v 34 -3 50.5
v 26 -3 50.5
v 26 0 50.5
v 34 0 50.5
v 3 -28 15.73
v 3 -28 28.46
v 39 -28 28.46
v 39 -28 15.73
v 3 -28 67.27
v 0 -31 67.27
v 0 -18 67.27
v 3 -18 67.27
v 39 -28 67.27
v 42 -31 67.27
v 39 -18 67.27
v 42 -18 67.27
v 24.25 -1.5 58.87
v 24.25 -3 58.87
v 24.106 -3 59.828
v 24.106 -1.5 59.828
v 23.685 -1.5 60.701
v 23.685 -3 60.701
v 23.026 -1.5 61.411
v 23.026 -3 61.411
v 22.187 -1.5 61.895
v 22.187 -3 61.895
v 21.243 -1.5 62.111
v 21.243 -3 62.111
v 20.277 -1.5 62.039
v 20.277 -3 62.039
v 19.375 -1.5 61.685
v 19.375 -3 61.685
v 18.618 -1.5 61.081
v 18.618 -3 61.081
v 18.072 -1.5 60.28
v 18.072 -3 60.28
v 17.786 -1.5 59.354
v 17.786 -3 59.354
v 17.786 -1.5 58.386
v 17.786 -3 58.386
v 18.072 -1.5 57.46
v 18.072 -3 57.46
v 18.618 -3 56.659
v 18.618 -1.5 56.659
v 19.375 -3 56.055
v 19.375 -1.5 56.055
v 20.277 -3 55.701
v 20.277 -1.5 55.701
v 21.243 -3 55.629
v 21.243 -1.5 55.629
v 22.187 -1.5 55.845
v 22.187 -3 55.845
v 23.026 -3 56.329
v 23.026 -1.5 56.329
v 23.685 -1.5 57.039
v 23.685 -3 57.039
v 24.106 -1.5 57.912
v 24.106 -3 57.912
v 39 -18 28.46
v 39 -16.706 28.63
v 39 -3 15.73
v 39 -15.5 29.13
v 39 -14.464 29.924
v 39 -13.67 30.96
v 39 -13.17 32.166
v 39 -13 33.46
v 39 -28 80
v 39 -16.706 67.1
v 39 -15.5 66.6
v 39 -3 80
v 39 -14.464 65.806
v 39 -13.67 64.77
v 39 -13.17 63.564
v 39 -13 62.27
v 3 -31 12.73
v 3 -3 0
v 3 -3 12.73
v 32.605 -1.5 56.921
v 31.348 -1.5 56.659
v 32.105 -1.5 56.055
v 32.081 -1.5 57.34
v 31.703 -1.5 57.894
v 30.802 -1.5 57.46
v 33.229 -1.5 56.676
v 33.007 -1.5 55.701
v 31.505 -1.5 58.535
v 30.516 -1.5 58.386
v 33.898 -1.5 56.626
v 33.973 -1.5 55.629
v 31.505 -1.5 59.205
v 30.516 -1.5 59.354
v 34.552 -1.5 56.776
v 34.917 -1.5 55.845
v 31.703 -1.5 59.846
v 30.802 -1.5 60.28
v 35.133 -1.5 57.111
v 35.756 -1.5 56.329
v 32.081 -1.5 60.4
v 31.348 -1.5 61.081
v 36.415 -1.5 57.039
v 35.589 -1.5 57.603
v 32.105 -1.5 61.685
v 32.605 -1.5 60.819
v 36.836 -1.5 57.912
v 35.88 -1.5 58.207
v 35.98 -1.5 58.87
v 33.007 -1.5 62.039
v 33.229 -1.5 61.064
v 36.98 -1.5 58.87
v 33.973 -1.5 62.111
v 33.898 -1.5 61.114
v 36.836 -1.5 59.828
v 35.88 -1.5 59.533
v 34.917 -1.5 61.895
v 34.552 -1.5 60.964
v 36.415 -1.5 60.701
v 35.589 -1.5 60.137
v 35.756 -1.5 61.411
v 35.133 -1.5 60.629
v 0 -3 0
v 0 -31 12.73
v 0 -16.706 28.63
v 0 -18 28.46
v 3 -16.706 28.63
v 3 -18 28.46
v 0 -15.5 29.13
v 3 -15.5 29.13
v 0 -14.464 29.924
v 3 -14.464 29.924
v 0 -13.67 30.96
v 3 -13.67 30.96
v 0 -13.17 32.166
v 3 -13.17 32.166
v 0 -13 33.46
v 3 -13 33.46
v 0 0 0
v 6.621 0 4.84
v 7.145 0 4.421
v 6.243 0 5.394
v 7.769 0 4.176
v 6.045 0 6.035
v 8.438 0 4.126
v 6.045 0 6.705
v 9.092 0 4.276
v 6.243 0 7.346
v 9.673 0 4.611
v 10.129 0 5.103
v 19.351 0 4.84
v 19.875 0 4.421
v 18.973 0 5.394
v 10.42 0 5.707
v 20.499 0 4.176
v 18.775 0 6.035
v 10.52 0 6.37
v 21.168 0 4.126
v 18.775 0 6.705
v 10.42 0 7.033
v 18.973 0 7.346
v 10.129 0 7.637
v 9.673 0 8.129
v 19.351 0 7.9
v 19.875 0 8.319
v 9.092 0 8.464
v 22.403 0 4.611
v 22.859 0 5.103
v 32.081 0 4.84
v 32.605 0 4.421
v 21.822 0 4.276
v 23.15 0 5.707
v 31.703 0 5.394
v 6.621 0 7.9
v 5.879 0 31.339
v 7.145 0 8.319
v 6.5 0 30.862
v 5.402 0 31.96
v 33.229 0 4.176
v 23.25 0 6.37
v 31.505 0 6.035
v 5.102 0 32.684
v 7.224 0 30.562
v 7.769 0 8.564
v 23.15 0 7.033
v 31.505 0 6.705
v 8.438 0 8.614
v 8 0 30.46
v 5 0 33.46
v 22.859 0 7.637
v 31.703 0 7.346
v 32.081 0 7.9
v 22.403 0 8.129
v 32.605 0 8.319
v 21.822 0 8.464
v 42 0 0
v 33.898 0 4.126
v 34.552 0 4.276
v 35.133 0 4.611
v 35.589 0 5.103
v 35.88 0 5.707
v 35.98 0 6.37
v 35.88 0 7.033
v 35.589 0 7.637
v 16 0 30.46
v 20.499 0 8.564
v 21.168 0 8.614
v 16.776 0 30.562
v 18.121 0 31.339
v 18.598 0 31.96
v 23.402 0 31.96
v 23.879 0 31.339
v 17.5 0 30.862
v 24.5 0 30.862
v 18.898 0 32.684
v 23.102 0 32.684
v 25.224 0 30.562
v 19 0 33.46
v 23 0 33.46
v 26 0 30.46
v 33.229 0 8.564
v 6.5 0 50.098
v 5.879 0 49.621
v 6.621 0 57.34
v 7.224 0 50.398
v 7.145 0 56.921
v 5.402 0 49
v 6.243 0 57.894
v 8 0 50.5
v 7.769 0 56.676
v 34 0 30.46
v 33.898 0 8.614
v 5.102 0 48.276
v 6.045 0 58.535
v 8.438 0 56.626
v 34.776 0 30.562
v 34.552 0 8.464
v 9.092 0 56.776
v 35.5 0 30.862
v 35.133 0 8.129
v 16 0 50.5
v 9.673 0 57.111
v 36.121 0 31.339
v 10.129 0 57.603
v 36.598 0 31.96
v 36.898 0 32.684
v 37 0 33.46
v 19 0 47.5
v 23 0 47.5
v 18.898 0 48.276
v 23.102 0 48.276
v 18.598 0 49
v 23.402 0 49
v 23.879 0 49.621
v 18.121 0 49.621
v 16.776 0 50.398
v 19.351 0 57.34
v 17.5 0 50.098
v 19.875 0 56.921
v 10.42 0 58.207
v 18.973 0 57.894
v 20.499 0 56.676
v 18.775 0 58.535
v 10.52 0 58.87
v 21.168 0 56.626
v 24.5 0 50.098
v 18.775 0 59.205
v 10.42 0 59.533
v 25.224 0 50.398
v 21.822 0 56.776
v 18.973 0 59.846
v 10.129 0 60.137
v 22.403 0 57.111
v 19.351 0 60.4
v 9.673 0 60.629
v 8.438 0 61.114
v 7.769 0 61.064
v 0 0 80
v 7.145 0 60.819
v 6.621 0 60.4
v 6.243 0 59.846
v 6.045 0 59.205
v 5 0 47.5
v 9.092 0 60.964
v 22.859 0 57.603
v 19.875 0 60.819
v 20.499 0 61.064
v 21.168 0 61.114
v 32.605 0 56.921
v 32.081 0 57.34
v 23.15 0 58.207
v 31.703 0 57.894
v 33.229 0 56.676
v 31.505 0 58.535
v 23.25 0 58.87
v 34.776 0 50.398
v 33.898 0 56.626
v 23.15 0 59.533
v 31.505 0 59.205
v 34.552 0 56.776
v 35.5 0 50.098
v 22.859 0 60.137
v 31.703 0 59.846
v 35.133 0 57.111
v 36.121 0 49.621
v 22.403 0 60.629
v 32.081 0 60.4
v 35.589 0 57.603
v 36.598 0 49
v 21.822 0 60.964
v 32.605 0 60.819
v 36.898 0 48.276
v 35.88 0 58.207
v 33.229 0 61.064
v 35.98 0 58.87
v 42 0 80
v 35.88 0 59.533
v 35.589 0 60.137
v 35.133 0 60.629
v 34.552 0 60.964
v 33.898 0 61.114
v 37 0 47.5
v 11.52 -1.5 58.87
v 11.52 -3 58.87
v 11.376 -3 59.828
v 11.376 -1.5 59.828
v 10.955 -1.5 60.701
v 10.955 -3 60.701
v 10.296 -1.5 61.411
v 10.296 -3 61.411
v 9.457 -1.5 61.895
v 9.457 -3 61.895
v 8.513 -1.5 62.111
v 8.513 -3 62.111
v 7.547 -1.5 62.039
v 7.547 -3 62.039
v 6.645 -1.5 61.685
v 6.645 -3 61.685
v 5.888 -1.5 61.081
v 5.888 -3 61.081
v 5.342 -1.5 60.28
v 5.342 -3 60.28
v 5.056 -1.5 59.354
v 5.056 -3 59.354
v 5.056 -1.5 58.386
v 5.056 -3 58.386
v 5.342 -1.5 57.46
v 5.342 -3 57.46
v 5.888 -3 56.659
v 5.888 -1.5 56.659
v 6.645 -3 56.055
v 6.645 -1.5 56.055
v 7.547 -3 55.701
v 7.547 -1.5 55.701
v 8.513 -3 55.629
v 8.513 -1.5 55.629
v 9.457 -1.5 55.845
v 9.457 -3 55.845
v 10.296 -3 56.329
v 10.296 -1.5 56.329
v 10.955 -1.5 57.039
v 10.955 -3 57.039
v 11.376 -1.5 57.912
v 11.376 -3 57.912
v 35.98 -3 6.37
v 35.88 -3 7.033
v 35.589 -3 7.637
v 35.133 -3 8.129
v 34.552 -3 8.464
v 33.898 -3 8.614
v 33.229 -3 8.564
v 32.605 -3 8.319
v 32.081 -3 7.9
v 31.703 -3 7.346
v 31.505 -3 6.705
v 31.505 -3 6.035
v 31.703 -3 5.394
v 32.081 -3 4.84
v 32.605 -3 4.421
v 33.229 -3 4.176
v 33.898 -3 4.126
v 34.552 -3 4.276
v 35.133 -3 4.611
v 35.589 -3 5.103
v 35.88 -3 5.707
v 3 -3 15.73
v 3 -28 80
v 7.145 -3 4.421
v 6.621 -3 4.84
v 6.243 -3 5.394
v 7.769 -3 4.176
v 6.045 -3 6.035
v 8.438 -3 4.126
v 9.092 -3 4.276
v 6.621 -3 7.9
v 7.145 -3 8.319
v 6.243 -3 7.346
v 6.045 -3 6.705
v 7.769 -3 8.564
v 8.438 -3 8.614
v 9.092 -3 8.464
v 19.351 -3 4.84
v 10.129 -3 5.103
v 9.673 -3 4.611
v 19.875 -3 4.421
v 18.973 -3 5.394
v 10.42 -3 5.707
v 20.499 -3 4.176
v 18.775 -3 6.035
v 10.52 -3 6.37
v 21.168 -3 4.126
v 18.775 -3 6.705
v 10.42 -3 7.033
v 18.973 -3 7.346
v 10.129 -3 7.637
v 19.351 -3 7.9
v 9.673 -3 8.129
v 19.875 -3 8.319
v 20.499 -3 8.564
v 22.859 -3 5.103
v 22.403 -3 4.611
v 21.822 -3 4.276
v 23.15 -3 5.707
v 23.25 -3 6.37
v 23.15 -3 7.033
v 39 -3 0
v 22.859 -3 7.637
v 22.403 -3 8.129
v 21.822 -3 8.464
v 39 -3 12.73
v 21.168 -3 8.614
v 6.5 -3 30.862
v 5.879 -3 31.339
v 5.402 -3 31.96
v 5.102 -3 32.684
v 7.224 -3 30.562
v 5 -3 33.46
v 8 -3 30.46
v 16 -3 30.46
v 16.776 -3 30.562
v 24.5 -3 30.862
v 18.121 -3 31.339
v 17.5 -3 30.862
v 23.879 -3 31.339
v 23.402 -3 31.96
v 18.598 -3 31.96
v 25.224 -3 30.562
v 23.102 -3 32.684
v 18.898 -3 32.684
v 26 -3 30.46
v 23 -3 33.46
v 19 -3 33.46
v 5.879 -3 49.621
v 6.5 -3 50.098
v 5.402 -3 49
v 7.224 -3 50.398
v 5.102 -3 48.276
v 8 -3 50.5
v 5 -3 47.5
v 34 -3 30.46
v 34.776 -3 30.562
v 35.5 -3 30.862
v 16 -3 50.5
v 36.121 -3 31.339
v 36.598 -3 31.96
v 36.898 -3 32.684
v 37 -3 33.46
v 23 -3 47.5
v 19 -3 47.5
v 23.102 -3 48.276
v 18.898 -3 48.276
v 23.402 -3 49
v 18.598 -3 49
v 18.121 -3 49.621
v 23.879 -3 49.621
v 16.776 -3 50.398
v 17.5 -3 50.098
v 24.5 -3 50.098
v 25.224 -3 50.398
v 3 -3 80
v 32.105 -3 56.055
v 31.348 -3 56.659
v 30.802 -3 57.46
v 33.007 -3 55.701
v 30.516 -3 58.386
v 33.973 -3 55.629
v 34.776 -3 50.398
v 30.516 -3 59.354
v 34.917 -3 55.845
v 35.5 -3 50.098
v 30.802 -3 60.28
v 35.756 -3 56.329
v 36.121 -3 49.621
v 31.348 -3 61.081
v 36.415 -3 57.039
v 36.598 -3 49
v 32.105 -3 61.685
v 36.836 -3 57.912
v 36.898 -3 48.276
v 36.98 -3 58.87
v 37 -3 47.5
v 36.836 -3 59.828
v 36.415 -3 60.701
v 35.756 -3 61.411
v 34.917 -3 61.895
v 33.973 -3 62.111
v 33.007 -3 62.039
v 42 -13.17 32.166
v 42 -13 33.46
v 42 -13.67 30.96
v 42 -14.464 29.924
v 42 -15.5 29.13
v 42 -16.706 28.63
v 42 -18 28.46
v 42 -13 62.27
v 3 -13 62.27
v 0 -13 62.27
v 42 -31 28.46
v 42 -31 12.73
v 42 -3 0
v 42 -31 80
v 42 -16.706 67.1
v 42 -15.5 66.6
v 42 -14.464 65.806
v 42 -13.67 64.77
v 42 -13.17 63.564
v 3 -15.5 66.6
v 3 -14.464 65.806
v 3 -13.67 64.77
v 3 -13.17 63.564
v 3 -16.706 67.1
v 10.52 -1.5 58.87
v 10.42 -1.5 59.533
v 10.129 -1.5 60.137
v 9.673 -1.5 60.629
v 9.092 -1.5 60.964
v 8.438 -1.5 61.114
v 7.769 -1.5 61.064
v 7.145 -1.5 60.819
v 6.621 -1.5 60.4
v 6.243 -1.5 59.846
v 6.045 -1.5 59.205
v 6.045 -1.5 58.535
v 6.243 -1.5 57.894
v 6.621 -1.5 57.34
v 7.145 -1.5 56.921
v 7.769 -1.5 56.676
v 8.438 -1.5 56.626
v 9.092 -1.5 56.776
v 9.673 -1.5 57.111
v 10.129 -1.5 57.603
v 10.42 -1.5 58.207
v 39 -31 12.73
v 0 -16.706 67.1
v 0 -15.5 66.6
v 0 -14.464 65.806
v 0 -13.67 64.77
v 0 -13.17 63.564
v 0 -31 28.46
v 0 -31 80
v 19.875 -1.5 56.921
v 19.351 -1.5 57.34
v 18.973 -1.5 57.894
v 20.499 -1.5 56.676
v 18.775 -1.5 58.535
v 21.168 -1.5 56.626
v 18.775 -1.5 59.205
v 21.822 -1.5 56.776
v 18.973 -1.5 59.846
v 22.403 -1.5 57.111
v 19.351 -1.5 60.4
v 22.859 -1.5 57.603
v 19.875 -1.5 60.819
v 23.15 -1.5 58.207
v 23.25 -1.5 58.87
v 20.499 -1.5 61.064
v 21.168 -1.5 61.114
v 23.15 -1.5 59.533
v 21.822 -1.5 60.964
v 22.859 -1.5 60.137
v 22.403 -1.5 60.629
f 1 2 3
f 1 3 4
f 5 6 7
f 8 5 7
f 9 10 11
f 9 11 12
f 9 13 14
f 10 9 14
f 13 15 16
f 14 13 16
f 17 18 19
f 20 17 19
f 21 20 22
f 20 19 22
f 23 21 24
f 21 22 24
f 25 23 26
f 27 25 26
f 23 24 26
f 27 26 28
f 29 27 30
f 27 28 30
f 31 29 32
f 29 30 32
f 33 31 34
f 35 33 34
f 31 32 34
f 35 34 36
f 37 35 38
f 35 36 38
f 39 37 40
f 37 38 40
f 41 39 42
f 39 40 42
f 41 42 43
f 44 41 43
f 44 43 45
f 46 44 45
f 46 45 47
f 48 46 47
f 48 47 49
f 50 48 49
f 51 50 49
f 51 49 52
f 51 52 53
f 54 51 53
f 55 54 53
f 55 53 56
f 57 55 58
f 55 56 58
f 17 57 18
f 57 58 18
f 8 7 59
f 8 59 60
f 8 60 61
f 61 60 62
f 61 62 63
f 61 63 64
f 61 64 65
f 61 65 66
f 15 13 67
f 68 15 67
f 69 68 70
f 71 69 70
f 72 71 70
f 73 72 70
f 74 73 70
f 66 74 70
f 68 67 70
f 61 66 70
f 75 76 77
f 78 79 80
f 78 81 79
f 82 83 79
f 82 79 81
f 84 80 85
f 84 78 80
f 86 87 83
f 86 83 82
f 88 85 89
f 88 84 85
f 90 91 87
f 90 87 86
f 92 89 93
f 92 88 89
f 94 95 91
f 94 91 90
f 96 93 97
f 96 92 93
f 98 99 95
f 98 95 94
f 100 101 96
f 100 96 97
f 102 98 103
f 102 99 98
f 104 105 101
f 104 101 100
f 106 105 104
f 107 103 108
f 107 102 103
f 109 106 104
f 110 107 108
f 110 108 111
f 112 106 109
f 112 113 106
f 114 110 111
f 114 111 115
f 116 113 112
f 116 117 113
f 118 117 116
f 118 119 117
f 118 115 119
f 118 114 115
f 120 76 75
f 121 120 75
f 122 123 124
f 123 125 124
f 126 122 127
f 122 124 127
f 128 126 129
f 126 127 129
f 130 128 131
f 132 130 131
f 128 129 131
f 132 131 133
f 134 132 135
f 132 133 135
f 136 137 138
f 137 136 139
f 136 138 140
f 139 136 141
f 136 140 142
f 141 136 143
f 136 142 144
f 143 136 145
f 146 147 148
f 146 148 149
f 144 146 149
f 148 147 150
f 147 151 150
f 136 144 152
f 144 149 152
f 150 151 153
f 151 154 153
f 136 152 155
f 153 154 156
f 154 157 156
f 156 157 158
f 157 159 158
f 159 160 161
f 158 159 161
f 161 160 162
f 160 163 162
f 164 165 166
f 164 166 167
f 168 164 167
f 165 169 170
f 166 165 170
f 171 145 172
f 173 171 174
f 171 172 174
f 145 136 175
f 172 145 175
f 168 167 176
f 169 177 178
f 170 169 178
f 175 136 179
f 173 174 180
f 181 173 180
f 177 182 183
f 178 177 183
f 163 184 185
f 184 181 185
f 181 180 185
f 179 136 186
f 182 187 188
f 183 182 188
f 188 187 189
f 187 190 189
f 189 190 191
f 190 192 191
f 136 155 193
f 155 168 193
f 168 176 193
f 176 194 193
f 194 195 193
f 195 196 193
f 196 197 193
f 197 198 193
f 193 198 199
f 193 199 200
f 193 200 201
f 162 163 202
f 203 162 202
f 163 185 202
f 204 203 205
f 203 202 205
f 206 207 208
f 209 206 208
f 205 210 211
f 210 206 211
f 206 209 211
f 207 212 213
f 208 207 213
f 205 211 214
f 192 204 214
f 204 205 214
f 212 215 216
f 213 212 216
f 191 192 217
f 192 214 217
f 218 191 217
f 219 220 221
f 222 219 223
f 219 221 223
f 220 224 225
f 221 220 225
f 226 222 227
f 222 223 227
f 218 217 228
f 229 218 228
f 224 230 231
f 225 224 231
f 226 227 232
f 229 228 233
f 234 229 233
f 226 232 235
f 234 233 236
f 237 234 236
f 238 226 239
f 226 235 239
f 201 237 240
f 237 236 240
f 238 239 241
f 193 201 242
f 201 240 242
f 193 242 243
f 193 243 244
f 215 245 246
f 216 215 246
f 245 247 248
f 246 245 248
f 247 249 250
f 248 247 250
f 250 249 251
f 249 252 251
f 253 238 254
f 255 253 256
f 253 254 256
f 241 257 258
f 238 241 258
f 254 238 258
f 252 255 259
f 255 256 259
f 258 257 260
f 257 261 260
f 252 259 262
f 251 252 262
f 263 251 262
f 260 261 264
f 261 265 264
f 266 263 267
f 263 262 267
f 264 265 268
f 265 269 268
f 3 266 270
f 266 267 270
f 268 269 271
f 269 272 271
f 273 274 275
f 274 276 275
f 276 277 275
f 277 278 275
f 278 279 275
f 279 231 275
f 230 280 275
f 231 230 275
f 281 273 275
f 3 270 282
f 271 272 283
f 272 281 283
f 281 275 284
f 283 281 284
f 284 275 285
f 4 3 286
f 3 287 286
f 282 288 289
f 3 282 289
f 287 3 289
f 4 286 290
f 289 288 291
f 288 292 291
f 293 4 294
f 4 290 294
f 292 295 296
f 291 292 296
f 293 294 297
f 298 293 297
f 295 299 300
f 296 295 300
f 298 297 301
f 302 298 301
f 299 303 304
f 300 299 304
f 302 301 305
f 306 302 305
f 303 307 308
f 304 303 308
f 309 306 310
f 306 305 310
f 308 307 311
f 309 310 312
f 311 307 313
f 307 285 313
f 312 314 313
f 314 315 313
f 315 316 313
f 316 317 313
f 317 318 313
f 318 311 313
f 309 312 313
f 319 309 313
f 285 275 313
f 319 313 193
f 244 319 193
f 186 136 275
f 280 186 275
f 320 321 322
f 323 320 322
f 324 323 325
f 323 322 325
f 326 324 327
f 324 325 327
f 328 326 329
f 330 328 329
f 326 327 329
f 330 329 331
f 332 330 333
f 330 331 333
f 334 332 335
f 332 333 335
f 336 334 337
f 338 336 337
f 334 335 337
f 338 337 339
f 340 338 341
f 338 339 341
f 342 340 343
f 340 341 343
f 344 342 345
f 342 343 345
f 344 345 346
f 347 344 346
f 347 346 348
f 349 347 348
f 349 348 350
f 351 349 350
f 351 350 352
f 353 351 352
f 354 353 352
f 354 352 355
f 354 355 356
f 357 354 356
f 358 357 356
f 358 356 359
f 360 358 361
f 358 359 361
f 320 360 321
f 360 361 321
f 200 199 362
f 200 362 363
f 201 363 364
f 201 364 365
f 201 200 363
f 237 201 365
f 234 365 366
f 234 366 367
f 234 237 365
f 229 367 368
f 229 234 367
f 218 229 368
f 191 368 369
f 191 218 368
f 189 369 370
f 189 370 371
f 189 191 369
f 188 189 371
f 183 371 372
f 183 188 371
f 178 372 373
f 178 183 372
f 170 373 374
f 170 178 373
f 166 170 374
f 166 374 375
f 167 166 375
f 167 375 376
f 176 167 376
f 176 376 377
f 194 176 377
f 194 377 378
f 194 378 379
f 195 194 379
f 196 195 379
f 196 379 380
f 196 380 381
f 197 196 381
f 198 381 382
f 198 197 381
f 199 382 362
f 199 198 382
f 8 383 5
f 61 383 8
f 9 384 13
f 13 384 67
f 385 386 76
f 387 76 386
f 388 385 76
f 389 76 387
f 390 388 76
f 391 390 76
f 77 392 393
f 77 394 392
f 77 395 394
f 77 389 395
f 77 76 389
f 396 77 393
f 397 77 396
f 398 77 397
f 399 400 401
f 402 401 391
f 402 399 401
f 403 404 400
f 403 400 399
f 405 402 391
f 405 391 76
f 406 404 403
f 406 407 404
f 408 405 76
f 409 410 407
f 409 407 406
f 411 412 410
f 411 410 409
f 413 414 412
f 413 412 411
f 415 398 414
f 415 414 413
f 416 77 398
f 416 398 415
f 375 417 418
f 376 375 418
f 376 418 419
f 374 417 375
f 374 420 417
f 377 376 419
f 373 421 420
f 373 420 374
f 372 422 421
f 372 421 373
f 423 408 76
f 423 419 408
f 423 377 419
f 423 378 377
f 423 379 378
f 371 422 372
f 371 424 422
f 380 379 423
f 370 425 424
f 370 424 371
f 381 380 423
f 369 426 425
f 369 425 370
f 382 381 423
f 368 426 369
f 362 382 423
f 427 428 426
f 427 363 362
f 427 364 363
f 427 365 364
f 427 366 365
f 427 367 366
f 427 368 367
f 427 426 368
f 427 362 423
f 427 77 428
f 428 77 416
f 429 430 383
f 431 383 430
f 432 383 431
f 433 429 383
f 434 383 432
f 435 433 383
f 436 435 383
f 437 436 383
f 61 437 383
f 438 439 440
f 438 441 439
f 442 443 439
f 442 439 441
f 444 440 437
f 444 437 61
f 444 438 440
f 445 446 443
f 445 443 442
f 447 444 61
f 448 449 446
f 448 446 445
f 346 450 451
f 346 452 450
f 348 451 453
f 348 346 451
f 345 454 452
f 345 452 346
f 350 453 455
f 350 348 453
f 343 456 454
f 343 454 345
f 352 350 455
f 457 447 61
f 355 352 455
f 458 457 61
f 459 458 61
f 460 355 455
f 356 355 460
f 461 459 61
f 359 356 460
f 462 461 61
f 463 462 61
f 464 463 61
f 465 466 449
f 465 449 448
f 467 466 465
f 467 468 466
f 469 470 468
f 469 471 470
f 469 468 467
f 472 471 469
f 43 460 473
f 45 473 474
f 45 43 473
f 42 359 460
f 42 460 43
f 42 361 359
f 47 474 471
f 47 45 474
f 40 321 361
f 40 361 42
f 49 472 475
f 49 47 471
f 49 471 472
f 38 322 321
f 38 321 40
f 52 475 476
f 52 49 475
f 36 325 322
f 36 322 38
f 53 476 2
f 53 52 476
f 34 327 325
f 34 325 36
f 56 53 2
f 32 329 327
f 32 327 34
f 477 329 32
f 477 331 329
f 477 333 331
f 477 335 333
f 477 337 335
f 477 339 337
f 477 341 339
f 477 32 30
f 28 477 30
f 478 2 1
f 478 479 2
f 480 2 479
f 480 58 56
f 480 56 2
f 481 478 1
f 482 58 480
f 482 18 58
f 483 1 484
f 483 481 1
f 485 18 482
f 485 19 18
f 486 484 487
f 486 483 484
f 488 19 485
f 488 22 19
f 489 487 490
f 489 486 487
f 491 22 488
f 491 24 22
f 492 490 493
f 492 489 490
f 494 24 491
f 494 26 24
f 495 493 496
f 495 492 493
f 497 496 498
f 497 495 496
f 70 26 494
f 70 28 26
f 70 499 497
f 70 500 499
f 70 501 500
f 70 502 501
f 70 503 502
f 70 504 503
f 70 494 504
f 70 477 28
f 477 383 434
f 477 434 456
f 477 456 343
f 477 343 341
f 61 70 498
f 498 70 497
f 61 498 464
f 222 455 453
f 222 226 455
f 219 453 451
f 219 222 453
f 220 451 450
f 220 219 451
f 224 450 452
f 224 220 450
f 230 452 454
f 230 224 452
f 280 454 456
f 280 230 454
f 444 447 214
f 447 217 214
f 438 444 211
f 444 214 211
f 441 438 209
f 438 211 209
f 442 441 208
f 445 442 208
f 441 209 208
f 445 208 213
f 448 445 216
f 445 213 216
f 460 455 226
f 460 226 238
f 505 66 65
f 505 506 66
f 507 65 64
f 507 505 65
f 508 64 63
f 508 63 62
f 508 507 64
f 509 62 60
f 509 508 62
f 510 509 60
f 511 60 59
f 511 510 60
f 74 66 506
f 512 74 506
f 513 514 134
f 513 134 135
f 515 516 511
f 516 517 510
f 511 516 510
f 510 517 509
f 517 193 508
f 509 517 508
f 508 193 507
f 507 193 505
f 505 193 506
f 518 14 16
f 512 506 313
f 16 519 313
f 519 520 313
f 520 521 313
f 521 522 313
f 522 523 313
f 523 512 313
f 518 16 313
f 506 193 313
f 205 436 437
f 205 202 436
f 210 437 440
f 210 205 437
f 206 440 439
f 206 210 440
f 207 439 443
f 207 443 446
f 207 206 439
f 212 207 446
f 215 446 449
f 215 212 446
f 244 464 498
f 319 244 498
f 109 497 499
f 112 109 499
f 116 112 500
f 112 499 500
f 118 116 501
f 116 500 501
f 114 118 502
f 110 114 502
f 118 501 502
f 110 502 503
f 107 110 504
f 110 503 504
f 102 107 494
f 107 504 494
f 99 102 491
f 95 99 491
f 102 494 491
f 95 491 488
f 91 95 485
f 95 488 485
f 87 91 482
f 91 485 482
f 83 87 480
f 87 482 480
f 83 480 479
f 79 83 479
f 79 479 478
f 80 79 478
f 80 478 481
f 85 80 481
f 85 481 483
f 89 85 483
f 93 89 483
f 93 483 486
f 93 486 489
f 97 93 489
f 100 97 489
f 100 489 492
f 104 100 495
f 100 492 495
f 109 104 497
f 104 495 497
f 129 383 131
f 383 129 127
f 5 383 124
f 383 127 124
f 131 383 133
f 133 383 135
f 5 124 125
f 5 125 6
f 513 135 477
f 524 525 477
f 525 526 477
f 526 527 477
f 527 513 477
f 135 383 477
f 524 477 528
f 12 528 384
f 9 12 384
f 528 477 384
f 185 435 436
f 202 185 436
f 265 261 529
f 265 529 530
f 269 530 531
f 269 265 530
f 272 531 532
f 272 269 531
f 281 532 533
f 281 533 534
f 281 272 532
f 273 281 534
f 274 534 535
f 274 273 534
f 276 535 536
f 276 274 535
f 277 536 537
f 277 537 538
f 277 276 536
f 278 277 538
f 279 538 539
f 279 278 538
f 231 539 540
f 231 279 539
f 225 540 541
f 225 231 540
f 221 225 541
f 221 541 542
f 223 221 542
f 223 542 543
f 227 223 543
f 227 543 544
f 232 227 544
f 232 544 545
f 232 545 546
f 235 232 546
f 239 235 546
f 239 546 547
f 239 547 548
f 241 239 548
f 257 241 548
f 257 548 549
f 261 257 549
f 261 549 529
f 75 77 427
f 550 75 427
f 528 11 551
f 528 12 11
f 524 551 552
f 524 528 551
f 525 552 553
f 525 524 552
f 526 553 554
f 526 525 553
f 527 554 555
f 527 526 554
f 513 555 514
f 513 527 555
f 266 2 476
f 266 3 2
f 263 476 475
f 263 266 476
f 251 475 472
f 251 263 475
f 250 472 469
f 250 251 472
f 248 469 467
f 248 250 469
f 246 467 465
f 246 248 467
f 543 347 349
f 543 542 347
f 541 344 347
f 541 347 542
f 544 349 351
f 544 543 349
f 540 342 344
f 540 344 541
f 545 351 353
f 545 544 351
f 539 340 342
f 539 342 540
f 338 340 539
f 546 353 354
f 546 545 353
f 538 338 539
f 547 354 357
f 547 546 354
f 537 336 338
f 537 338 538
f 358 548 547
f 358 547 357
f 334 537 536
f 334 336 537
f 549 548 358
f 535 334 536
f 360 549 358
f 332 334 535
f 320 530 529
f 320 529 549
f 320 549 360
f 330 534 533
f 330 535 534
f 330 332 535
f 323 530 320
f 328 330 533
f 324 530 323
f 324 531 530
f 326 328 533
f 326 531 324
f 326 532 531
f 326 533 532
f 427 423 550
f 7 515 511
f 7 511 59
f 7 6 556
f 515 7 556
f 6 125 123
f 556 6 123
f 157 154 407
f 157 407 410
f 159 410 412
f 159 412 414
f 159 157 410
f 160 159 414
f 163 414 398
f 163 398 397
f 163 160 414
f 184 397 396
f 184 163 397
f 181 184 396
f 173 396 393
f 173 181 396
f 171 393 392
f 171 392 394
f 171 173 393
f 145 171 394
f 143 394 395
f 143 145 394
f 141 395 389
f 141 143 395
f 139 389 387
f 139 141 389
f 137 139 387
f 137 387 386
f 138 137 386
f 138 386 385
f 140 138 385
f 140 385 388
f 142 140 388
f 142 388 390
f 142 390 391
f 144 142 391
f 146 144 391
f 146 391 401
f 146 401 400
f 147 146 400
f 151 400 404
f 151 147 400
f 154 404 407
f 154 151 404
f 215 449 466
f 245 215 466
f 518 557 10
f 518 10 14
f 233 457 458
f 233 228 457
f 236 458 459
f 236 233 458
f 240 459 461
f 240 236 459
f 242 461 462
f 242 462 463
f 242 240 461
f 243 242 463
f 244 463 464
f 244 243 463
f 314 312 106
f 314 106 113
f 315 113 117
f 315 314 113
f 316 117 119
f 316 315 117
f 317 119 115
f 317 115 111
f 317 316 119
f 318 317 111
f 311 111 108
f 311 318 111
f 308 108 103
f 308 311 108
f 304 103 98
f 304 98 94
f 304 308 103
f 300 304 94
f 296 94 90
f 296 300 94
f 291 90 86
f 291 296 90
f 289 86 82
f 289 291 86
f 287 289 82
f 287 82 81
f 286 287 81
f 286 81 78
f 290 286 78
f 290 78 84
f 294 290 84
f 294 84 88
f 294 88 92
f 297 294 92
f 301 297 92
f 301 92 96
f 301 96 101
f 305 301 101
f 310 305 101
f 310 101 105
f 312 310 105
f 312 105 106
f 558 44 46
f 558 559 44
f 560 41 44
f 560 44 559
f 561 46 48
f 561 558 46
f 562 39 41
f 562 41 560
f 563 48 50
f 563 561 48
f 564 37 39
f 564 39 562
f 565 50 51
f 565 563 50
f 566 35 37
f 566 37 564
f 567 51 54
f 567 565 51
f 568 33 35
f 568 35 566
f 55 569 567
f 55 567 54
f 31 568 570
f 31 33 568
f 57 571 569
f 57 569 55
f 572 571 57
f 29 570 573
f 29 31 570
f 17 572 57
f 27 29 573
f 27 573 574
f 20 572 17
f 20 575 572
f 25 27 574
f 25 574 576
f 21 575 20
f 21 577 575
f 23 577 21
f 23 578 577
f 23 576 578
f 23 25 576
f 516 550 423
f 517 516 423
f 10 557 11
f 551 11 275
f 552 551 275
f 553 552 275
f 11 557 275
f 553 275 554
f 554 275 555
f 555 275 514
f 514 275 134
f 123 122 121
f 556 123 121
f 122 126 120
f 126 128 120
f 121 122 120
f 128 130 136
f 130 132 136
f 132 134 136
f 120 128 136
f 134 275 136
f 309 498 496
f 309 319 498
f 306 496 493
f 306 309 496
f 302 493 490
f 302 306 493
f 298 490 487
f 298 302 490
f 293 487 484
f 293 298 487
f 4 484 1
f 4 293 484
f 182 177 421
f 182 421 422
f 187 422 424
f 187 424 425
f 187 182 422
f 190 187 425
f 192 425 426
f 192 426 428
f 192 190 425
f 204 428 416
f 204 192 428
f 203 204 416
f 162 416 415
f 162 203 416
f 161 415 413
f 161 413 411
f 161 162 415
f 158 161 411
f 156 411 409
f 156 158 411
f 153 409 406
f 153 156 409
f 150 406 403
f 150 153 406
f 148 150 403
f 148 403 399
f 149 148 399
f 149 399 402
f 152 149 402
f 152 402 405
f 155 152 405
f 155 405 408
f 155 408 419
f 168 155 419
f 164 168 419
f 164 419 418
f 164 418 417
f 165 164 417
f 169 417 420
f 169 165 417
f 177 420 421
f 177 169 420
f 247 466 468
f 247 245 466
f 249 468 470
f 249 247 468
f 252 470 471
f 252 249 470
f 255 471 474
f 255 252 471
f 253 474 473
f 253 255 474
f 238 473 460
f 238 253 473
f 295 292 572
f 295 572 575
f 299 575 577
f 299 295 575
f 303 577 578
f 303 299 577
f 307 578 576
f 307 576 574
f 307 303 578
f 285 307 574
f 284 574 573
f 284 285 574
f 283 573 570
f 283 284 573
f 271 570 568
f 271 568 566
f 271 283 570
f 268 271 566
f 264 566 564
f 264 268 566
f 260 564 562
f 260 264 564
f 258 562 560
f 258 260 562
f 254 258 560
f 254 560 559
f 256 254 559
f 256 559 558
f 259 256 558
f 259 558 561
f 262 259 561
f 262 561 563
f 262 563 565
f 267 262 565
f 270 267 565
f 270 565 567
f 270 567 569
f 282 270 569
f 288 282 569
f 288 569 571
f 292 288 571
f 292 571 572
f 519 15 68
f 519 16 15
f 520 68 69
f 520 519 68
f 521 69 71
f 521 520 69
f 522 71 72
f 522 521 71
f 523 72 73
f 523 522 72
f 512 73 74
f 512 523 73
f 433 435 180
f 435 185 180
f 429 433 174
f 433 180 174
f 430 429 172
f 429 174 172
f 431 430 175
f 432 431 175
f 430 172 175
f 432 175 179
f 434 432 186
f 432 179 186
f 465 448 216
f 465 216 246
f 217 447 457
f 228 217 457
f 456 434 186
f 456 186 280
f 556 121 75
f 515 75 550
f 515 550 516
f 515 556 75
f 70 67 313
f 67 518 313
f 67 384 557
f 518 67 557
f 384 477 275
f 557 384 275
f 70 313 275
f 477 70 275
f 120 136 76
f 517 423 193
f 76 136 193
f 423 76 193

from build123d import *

# Parameters (mm, degrees)
F0_W      = 36
F0_H      = 12.73
F0_W_2    = 3
F1_DEPTH  = 31
F0_H_2    = 38.81
F2_DEPTH  = 13
F0_R      = 2.25
F3_DEPTH  = 3
F4_DEPTH  = 3
F5_DEPTH  = 31
F7_DEPTH  = 12.73
F8_W      = 36
F8_H      = 25
F9_DEPTH  = 25
F11_DEPTH = 25
F13_DEPTH = 25
F14_R     = 3.25
F14_R_2   = 2.25
F15_DEPTH = 1.5
F16_W     = 14
F16_H     = 20.04
F17_DEPTH = 25
F18_R     = 3
F19_R     = 5


# Not quite as in the source:
# - a feature names something its author has since deleted; it is built from what else it names


with BuildPart() as f1:
    # F0 (on Front) → F1 (new body)
    with BuildSketch(Plane.XZ):
        with Locations((21, 73.635)):
            Rectangle(F0_W, F0_H)
        with Locations((1.5, 73.635)):
            Rectangle(F0_W_2, F0_H)
        with Locations((40.5, 73.635)):
            Rectangle(F0_W_2, F0_H)
    extrude(amount=F1_DEPTH)



with BuildPart() as f1b:
    # F0 (on Front) → F1, piece 2 (new body)
    with BuildSketch(Plane.XZ):
        with Locations((40.5, 22.095)):
            Rectangle(F0_W_2, F0_H)
        with Locations((21, 22.095)):
            Rectangle(F0_W, F0_H)
        with Locations((1.5, 22.095)):
            Rectangle(F0_W_2, F0_H)
        Polygon((0, 15.73), (0, 12.73), (3, 12.73), (39, 12.73), (42, 12.73), (42, 15.73), (39, 15.73), (3, 15.73), align=None)
    extrude(amount=F1_DEPTH)


with BuildPart() as f1_1:
    add(f1.part)

    add(f1b.part)  # F2 merges F1b
    # F0 (on Front) → F2 (join)
    with BuildSketch(Plane.XZ):
        with Locations((40.5, 47.865)):
            Rectangle(F0_W_2, F0_H_2)
        with Locations((1.5, 47.865)):
            Rectangle(F0_W_2, F0_H_2)
    extrude(amount=F2_DEPTH)

    # F0 (on Front) → F3 (join)
    with BuildSketch(Plane.XZ):
        with Locations((21, 6.365)):
            Rectangle(F0_W, F0_H)
        with Locations((8.27, 6.37)):
            Circle(F0_R, mode=Mode.SUBTRACT)
        with Locations((21, 6.37)):
            Circle(F0_R, mode=Mode.SUBTRACT)
        with Locations((33.73, 6.37)):
            Circle(F0_R, mode=Mode.SUBTRACT)
    extrude(amount=F3_DEPTH)

    # F0 (on Front) → F4 (join)
    with BuildSketch(Plane.XZ):
        with Locations((21, 47.865)):
            Rectangle(F0_W, F0_H_2)
        with Locations((8.27, 58.87)):
            Circle(F0_R, mode=Mode.SUBTRACT)
        with Locations((21, 58.87)):
            Circle(F0_R, mode=Mode.SUBTRACT)
        with Locations((33.73, 58.87)):
            Circle(F0_R, mode=Mode.SUBTRACT)
    extrude(amount=F4_DEPTH)

    # F0 (on Front) → F5 (join)
    with BuildSketch(Plane.XZ):
        with Locations((40.5, 6.365)):
            Rectangle(F0_W_2, F0_H)
        with Locations((1.5, 6.365)):
            Rectangle(F0_W_2, F0_H)
    extrude(amount=F5_DEPTH)

    # F6 (on face) → F7 (cut)
    with BuildSketch(Plane.XY.offset(28.46)):
        Polygon((39, -3), (3, -3), (3, -13), (3, -28), (39, -28), (39, -13), align=None)
    extrude(amount=-F7_DEPTH, mode=Mode.SUBTRACT)

    # F8 (on face) → F9 (cut)
    with BuildSketch(Plane.XY.offset(80)):
        with Locations((21, -15.5)):
            Rectangle(F8_W, F8_H)
    extrude(amount=-F9_DEPTH, mode=Mode.SUBTRACT)

    # F10 (on face) → F11 (cut)
    with BuildSketch(Plane.YZ.offset(3)):
        Polygon((-3, 0), (-31, 12.73), (-31, 0), align=None)
    extrude(amount=-F11_DEPTH, mode=Mode.SUBTRACT)

    # F12 (on face) → F13 (cut)
    with BuildSketch(Plane(origin=(39, 0, 0), x_dir=(0, -1, 0), z_dir=(-1, 0, 0))):
        Polygon((31, 0), (31, 12.73), (3, 0), align=None)
    extrude(amount=-F13_DEPTH, mode=Mode.SUBTRACT)

    # F14 (on face) → F15 (cut)
    with BuildSketch(Plane.XZ.offset(3)):
        with Locations((8.27, 58.87)):
            Circle(F14_R)
        with Locations((8.27, 58.87)):
            Circle(F14_R_2, mode=Mode.SUBTRACT)
        with Locations((21, 58.87)):
            Circle(F14_R)
        with Locations((21, 58.87)):
            Circle(F14_R_2, mode=Mode.SUBTRACT)
        with Locations((33.73, 58.87)):
            Circle(F14_R)
        with Locations((33.73, 58.87)):
            Circle(F14_R_2, mode=Mode.SUBTRACT)
    extrude(amount=-F15_DEPTH, mode=Mode.SUBTRACT)

    # F16 (on face) → F17 (cut)
    with BuildSketch(Plane.XZ.offset(3)):
        with Locations((12, 40.48)):
            Rectangle(F16_W, F16_H)
        with Locations((30, 40.48)):
            Rectangle(F16_W, F16_H)
    extrude(amount=-F17_DEPTH, mode=Mode.SUBTRACT)

    # F18
    f18_edges = [f1_1.edges().sort_by_distance(p)[0] for p in [
        (5, -1.5, 50.5),
        (5, -1.5, 30.46),
        (37, -1.5, 30.46),
        (23, -1.5, 30.46),
        (19, -1.5, 30.46),
        (19, -1.5, 50.5),
        (23, -1.5, 50.5),
        (37, -1.5, 50.5),
    ]]
    fillet(f18_edges, radius=F18_R)

    # F19
    f19_edges = [f1_1.edges().sort_by_distance(p)[0] for p in [
        (1.5, -13, 67.27),
        (40.5, -13, 67.27),
        (1.5, -13, 28.46),
        (40.5, -13, 28.46),
    ]]
    fillet(f19_edges, radius=F19_R)


solid = f1_1.part
